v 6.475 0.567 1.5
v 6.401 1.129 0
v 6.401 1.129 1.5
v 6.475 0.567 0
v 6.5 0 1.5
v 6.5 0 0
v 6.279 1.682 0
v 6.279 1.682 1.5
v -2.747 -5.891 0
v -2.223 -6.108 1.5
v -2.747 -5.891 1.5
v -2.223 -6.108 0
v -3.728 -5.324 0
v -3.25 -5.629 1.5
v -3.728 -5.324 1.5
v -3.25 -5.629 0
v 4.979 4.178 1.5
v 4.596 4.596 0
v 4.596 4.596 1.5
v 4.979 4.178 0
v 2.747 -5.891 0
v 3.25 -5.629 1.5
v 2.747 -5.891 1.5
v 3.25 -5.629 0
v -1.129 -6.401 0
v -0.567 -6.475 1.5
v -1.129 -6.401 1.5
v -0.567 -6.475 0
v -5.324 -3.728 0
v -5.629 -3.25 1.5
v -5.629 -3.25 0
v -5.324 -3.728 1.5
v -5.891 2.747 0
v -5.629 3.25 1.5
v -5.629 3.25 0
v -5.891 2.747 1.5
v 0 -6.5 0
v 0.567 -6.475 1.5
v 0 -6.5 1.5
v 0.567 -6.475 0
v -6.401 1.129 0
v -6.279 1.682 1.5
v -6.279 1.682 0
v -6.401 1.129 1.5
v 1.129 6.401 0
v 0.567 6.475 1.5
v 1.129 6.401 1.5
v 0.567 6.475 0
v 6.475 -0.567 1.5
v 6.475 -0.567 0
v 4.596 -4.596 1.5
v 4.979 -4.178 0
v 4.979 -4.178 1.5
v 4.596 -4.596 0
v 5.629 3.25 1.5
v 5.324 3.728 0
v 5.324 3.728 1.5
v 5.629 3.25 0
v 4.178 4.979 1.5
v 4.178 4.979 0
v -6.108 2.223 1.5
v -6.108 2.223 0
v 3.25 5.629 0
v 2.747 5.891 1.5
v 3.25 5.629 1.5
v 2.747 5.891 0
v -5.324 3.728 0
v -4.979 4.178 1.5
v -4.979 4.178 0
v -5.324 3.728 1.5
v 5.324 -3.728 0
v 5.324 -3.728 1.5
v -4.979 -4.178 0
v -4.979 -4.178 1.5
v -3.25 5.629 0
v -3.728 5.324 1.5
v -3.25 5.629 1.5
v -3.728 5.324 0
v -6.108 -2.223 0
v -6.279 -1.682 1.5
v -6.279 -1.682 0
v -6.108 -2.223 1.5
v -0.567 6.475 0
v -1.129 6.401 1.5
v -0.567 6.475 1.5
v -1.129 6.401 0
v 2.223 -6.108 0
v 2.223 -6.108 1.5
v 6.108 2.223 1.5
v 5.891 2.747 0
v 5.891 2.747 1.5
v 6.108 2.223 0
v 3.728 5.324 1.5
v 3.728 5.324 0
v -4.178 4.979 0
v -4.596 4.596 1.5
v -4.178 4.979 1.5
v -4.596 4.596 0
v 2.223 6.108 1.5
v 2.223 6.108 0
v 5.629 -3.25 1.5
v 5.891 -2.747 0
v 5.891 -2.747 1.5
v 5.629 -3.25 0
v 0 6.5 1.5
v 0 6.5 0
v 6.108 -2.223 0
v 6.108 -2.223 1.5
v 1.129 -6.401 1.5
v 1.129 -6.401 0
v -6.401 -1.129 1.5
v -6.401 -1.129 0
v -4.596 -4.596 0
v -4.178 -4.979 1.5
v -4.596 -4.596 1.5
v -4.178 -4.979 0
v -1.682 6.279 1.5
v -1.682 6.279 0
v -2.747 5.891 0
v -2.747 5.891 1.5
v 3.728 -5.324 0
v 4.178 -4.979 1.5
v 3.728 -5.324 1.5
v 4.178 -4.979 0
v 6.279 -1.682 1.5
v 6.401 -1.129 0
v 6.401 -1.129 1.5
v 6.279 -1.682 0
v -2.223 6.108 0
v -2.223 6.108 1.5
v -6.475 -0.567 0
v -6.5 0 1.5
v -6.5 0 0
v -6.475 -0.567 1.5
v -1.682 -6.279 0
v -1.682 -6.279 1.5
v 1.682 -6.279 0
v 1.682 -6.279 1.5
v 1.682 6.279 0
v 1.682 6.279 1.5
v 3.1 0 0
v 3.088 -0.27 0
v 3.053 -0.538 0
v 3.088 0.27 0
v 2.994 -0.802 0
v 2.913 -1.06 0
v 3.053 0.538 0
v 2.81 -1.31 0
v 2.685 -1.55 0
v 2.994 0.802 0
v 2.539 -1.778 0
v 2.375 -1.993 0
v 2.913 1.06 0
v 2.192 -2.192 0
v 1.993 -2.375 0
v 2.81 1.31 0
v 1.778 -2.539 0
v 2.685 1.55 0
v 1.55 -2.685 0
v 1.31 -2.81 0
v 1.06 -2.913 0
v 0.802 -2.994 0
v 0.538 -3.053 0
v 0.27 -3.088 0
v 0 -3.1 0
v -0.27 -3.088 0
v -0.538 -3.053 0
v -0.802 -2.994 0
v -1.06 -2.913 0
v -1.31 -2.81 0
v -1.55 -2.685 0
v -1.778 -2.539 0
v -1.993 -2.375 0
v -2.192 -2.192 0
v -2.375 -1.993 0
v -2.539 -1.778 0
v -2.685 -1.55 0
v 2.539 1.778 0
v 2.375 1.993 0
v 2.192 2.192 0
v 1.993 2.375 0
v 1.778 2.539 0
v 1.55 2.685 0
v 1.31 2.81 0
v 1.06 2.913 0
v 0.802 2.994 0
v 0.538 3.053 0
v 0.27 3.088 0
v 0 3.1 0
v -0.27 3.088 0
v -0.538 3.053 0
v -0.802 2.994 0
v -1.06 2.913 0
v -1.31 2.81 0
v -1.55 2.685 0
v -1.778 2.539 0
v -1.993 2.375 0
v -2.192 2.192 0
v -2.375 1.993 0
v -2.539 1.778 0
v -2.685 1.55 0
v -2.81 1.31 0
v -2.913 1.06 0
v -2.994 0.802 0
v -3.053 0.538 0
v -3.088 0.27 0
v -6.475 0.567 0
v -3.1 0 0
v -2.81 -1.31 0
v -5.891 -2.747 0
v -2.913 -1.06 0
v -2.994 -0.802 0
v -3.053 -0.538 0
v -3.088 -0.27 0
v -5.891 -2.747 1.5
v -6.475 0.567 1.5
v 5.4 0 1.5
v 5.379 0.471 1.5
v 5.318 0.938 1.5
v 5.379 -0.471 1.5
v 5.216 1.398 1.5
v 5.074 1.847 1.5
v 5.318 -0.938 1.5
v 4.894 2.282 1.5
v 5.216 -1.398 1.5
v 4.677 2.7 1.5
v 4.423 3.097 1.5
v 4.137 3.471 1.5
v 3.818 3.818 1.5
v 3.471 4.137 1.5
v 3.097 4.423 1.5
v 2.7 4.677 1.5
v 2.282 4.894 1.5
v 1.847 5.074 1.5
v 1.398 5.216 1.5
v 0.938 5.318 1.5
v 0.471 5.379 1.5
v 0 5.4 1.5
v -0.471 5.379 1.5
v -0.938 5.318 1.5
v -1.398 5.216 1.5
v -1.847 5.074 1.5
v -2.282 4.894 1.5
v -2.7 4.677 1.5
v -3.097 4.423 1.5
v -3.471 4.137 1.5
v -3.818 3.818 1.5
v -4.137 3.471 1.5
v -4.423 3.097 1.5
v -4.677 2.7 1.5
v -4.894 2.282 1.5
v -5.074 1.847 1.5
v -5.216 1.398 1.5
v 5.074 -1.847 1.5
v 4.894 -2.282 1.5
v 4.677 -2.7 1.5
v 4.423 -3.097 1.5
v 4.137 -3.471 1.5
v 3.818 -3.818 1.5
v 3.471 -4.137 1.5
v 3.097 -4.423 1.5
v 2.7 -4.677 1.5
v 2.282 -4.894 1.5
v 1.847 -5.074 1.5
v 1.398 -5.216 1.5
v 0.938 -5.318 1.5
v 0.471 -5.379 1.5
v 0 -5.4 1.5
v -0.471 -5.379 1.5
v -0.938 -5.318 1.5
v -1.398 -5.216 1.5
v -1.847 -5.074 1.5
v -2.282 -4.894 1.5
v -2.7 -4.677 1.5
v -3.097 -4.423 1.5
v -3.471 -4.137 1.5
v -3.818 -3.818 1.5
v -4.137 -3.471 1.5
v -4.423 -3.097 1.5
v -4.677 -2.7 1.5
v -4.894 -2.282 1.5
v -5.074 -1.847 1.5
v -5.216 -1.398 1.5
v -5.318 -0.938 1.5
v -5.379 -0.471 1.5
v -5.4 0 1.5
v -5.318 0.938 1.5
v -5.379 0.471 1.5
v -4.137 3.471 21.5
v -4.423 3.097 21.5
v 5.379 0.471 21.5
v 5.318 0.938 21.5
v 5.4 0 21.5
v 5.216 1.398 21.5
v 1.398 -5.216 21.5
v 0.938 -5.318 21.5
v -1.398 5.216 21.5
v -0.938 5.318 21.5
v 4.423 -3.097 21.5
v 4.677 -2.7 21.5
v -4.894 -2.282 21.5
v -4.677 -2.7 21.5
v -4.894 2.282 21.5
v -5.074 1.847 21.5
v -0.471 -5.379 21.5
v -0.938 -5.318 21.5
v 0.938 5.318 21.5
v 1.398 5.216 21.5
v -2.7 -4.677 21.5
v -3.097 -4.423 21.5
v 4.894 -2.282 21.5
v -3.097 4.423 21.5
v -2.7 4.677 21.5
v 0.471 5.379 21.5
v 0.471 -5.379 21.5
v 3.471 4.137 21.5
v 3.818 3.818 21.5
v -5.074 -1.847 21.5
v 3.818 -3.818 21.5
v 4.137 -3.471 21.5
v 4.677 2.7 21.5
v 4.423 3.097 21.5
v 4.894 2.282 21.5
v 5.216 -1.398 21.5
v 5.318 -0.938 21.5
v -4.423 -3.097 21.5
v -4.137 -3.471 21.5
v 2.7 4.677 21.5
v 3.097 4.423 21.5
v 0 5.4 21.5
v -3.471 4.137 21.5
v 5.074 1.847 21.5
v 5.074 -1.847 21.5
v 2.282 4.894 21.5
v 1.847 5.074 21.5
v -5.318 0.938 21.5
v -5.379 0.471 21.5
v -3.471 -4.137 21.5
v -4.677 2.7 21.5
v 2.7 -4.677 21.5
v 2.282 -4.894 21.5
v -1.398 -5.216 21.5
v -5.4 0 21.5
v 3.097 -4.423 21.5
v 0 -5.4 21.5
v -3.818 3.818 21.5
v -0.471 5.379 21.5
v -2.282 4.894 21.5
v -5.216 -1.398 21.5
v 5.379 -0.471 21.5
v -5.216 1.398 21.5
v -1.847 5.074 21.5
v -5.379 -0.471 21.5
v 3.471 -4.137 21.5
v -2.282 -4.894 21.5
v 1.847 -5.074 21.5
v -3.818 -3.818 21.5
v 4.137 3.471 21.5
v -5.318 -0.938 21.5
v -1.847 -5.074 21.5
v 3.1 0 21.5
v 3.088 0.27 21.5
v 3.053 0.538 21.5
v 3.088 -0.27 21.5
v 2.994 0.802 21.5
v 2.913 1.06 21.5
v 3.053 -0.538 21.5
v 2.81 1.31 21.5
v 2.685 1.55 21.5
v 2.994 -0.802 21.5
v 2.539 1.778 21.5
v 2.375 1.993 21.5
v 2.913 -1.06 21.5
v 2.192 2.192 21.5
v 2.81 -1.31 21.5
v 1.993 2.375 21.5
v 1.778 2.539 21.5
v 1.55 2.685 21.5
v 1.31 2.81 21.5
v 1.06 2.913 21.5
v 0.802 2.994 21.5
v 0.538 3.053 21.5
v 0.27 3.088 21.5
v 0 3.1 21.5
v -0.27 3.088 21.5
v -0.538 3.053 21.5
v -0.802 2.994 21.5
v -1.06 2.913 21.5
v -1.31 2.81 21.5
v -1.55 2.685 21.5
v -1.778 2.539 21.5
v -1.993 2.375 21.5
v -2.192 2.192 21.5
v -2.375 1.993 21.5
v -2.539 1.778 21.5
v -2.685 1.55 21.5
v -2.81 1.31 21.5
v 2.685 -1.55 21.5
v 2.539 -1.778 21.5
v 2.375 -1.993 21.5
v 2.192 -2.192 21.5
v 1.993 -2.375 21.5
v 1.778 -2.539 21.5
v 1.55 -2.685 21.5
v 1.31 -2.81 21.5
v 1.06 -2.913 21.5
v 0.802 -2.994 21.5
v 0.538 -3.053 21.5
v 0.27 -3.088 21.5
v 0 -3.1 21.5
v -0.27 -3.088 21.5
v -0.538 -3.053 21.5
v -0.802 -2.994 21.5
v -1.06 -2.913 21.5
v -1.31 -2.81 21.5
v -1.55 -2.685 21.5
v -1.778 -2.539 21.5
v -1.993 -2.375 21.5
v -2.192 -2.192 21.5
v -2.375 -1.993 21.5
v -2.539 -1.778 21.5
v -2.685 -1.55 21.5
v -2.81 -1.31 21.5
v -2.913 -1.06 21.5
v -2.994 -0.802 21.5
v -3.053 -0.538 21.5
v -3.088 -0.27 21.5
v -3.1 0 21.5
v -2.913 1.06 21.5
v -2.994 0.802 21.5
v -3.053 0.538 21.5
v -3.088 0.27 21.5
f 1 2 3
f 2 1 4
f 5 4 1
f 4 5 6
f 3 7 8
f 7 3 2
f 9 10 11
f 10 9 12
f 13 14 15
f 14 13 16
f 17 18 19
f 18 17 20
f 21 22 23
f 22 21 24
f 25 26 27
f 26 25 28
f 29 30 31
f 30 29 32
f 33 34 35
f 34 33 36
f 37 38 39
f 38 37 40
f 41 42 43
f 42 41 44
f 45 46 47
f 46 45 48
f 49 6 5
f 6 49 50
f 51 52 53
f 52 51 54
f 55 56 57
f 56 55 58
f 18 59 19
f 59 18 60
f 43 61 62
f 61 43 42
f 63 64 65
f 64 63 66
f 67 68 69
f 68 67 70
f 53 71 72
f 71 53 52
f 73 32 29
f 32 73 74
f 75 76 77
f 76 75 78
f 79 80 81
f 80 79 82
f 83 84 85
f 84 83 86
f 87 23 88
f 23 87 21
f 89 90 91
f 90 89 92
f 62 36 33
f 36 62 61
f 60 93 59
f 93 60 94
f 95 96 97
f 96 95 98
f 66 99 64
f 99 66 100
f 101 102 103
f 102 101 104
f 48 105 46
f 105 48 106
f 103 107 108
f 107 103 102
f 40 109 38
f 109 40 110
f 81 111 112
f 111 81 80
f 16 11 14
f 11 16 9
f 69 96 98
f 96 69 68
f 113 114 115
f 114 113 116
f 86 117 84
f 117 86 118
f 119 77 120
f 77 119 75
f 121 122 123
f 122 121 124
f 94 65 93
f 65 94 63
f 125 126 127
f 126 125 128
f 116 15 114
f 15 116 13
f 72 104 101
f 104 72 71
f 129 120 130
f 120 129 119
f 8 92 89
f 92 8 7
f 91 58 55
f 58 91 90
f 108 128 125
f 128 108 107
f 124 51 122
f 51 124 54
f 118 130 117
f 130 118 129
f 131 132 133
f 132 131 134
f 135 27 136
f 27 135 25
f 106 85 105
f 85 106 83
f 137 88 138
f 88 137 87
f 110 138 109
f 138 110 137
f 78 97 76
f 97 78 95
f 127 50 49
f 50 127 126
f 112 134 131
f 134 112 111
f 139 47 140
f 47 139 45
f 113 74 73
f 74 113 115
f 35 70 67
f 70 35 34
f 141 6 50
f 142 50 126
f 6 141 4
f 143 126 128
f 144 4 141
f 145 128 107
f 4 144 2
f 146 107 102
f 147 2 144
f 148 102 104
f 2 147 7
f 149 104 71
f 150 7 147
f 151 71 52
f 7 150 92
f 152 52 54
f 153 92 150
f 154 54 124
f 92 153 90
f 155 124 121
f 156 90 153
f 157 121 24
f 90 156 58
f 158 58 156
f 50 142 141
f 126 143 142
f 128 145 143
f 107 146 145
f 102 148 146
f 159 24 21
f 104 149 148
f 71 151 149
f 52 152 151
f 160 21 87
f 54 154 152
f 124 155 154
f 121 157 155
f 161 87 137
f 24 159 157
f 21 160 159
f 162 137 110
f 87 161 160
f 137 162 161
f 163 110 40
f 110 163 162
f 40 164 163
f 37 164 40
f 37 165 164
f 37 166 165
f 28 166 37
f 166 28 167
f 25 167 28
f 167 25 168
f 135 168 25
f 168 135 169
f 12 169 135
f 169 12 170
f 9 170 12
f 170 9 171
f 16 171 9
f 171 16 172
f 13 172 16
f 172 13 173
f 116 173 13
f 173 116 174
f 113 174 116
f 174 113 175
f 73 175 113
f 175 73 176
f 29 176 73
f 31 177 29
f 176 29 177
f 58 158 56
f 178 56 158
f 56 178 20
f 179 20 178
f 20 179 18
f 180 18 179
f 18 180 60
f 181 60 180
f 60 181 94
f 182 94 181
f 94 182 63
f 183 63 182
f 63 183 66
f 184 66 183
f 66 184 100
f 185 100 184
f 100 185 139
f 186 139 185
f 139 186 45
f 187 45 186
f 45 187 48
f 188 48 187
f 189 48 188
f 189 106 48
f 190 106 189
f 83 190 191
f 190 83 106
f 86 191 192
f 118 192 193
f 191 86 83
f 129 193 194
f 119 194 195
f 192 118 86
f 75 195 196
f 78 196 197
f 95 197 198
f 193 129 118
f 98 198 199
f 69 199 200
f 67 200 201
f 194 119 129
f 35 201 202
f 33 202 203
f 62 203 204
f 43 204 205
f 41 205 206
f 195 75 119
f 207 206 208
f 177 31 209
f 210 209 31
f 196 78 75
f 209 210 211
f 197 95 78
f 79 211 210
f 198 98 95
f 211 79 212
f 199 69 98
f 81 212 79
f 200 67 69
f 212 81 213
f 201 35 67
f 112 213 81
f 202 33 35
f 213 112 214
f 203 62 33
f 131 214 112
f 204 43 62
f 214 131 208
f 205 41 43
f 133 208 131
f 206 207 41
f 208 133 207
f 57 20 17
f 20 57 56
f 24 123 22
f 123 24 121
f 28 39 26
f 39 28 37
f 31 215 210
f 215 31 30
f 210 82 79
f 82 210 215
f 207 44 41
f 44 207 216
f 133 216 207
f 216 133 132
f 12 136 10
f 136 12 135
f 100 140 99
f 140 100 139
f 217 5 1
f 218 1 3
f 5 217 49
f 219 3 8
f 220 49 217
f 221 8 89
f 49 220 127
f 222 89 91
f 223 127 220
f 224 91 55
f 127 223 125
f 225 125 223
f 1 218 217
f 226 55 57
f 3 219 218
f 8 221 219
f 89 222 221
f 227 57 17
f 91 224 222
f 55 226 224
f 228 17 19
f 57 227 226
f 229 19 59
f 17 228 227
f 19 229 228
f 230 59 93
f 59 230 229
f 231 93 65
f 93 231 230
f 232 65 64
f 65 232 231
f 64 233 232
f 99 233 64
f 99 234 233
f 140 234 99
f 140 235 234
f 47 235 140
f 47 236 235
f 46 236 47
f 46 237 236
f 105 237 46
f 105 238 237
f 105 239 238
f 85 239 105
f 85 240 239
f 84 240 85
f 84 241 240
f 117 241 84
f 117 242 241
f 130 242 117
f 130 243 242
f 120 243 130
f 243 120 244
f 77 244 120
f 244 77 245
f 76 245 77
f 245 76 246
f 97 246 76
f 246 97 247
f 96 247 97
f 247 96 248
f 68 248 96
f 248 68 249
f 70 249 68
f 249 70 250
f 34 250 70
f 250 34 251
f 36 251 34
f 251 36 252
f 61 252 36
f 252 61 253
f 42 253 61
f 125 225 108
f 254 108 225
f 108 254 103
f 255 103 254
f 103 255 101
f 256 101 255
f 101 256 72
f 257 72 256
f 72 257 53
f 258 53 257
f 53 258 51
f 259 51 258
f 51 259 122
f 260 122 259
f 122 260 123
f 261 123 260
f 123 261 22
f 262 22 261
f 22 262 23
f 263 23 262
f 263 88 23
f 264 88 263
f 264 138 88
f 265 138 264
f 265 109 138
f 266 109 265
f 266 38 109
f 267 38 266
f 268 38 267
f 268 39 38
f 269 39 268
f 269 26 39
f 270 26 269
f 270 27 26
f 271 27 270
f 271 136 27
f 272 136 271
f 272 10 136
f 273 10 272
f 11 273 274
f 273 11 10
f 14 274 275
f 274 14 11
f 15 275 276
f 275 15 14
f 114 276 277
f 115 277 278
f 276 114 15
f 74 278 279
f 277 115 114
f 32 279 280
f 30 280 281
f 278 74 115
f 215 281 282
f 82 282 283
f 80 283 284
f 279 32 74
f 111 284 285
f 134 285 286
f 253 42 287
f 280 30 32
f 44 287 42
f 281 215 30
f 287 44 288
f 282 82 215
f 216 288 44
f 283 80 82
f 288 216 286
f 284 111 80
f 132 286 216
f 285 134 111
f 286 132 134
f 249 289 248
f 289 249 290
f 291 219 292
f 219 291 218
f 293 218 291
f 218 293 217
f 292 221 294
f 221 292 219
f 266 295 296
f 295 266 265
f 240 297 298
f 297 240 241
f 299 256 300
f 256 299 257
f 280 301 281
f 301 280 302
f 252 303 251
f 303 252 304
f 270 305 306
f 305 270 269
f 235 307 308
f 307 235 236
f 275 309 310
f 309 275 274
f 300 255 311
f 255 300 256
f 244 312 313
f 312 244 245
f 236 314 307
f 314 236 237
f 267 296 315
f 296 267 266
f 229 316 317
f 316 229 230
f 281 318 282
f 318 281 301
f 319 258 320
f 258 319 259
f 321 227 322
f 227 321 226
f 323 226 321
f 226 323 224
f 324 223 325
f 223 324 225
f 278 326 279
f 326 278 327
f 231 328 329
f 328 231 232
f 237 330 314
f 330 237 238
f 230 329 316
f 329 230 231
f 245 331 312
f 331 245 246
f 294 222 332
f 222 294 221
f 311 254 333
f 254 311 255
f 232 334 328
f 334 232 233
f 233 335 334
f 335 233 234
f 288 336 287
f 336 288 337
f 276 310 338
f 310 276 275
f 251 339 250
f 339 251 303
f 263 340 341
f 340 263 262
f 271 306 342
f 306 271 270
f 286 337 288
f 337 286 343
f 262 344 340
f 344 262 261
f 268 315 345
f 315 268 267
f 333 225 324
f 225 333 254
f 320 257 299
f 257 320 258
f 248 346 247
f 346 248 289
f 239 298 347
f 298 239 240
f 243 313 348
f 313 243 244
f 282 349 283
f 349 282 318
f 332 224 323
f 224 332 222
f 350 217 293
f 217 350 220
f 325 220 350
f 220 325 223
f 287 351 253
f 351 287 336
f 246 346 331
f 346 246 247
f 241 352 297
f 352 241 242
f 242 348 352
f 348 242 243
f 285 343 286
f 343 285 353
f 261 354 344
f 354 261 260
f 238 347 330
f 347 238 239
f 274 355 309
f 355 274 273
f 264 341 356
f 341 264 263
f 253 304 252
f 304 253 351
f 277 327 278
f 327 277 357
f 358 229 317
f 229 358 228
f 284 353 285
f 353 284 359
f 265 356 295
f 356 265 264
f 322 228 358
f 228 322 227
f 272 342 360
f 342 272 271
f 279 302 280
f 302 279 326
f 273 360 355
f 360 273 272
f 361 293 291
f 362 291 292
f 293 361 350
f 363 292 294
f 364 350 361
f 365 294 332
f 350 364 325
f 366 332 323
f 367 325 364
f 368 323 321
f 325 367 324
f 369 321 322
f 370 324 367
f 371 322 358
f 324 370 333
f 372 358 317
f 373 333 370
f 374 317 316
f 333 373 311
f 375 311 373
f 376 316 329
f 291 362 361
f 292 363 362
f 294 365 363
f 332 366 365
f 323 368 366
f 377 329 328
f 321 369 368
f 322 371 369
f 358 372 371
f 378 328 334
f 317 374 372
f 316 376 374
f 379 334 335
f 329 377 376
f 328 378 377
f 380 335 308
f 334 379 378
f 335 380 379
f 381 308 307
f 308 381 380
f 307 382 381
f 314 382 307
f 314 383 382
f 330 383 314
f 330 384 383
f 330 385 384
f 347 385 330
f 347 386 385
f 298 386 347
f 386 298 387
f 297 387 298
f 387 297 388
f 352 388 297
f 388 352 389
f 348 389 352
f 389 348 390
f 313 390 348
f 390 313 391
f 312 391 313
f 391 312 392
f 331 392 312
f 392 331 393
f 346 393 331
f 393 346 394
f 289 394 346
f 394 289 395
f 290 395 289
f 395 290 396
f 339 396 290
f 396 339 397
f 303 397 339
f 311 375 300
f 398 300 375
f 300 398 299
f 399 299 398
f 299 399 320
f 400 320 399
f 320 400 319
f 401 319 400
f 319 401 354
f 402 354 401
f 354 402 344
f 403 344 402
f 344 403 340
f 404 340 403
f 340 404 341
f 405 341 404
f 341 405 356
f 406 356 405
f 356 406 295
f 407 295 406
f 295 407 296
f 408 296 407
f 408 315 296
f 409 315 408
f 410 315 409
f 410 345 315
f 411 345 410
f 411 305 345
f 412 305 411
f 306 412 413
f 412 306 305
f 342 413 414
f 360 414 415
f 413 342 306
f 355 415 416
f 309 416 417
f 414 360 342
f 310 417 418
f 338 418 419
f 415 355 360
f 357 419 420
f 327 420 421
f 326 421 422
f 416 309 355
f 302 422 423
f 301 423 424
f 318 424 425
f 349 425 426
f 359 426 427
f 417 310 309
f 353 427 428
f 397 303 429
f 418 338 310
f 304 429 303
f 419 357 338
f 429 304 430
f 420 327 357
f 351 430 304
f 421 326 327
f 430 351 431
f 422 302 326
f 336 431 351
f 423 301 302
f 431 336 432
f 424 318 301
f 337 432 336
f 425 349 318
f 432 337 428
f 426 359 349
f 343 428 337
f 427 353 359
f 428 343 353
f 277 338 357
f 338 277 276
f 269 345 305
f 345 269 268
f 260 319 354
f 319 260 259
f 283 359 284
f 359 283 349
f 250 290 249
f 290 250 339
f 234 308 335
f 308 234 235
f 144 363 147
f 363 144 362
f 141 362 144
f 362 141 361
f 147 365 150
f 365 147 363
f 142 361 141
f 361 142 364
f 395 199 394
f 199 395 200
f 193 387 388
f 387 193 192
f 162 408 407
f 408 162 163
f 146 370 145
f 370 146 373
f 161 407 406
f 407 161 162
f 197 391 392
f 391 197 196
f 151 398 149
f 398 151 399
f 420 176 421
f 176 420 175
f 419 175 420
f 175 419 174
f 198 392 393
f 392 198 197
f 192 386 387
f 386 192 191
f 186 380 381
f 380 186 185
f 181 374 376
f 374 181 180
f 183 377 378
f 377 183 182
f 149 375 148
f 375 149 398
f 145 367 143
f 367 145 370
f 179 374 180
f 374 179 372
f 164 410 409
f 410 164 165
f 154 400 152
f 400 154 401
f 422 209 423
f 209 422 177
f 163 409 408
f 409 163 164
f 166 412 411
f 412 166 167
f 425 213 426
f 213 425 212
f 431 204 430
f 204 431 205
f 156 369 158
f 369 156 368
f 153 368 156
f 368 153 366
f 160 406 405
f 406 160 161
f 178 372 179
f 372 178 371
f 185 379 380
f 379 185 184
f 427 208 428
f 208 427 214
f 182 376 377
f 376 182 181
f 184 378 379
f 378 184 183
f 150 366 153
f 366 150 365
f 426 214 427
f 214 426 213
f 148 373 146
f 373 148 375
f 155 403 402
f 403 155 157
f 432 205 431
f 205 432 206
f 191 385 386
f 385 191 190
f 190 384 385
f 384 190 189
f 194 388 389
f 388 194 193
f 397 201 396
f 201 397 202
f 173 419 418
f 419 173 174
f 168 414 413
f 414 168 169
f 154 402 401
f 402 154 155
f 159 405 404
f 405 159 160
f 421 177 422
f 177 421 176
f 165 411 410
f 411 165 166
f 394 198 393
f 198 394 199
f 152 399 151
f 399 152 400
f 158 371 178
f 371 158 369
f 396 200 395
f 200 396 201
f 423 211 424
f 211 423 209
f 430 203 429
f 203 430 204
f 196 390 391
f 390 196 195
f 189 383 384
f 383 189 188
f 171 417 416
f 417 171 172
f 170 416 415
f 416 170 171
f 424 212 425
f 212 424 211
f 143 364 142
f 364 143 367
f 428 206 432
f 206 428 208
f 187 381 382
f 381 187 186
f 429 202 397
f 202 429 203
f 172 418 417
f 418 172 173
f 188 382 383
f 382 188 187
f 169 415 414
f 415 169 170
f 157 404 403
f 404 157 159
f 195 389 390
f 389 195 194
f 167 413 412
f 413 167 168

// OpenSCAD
// Adapter sleeve - a collar with a tube sleeve below, boring through, to adapt a smaller tube
// to a larger rack hole. NOVEL general part.
//

collar_d   = 13;
collar_h   = 1.5;
sleeve_d   = 10.8;
sleeve_h   = 21.5;
bore_d     = 6.2;

$fn = 72;

t = min(bore_d / 2 - 1, 2);          // wall thickness for the sleeve

difference() {
    union() {
        cylinder(h = collar_h, d = collar_d);                 // collar (contact the rack)
        cylinder(h = sleeve_h, d = sleeve_d);                 // sleeve body
    }
    translate([0, 0, -1]) cylinder(h = sleeve_h + 2, d = bore_d);   // through-bore
}
